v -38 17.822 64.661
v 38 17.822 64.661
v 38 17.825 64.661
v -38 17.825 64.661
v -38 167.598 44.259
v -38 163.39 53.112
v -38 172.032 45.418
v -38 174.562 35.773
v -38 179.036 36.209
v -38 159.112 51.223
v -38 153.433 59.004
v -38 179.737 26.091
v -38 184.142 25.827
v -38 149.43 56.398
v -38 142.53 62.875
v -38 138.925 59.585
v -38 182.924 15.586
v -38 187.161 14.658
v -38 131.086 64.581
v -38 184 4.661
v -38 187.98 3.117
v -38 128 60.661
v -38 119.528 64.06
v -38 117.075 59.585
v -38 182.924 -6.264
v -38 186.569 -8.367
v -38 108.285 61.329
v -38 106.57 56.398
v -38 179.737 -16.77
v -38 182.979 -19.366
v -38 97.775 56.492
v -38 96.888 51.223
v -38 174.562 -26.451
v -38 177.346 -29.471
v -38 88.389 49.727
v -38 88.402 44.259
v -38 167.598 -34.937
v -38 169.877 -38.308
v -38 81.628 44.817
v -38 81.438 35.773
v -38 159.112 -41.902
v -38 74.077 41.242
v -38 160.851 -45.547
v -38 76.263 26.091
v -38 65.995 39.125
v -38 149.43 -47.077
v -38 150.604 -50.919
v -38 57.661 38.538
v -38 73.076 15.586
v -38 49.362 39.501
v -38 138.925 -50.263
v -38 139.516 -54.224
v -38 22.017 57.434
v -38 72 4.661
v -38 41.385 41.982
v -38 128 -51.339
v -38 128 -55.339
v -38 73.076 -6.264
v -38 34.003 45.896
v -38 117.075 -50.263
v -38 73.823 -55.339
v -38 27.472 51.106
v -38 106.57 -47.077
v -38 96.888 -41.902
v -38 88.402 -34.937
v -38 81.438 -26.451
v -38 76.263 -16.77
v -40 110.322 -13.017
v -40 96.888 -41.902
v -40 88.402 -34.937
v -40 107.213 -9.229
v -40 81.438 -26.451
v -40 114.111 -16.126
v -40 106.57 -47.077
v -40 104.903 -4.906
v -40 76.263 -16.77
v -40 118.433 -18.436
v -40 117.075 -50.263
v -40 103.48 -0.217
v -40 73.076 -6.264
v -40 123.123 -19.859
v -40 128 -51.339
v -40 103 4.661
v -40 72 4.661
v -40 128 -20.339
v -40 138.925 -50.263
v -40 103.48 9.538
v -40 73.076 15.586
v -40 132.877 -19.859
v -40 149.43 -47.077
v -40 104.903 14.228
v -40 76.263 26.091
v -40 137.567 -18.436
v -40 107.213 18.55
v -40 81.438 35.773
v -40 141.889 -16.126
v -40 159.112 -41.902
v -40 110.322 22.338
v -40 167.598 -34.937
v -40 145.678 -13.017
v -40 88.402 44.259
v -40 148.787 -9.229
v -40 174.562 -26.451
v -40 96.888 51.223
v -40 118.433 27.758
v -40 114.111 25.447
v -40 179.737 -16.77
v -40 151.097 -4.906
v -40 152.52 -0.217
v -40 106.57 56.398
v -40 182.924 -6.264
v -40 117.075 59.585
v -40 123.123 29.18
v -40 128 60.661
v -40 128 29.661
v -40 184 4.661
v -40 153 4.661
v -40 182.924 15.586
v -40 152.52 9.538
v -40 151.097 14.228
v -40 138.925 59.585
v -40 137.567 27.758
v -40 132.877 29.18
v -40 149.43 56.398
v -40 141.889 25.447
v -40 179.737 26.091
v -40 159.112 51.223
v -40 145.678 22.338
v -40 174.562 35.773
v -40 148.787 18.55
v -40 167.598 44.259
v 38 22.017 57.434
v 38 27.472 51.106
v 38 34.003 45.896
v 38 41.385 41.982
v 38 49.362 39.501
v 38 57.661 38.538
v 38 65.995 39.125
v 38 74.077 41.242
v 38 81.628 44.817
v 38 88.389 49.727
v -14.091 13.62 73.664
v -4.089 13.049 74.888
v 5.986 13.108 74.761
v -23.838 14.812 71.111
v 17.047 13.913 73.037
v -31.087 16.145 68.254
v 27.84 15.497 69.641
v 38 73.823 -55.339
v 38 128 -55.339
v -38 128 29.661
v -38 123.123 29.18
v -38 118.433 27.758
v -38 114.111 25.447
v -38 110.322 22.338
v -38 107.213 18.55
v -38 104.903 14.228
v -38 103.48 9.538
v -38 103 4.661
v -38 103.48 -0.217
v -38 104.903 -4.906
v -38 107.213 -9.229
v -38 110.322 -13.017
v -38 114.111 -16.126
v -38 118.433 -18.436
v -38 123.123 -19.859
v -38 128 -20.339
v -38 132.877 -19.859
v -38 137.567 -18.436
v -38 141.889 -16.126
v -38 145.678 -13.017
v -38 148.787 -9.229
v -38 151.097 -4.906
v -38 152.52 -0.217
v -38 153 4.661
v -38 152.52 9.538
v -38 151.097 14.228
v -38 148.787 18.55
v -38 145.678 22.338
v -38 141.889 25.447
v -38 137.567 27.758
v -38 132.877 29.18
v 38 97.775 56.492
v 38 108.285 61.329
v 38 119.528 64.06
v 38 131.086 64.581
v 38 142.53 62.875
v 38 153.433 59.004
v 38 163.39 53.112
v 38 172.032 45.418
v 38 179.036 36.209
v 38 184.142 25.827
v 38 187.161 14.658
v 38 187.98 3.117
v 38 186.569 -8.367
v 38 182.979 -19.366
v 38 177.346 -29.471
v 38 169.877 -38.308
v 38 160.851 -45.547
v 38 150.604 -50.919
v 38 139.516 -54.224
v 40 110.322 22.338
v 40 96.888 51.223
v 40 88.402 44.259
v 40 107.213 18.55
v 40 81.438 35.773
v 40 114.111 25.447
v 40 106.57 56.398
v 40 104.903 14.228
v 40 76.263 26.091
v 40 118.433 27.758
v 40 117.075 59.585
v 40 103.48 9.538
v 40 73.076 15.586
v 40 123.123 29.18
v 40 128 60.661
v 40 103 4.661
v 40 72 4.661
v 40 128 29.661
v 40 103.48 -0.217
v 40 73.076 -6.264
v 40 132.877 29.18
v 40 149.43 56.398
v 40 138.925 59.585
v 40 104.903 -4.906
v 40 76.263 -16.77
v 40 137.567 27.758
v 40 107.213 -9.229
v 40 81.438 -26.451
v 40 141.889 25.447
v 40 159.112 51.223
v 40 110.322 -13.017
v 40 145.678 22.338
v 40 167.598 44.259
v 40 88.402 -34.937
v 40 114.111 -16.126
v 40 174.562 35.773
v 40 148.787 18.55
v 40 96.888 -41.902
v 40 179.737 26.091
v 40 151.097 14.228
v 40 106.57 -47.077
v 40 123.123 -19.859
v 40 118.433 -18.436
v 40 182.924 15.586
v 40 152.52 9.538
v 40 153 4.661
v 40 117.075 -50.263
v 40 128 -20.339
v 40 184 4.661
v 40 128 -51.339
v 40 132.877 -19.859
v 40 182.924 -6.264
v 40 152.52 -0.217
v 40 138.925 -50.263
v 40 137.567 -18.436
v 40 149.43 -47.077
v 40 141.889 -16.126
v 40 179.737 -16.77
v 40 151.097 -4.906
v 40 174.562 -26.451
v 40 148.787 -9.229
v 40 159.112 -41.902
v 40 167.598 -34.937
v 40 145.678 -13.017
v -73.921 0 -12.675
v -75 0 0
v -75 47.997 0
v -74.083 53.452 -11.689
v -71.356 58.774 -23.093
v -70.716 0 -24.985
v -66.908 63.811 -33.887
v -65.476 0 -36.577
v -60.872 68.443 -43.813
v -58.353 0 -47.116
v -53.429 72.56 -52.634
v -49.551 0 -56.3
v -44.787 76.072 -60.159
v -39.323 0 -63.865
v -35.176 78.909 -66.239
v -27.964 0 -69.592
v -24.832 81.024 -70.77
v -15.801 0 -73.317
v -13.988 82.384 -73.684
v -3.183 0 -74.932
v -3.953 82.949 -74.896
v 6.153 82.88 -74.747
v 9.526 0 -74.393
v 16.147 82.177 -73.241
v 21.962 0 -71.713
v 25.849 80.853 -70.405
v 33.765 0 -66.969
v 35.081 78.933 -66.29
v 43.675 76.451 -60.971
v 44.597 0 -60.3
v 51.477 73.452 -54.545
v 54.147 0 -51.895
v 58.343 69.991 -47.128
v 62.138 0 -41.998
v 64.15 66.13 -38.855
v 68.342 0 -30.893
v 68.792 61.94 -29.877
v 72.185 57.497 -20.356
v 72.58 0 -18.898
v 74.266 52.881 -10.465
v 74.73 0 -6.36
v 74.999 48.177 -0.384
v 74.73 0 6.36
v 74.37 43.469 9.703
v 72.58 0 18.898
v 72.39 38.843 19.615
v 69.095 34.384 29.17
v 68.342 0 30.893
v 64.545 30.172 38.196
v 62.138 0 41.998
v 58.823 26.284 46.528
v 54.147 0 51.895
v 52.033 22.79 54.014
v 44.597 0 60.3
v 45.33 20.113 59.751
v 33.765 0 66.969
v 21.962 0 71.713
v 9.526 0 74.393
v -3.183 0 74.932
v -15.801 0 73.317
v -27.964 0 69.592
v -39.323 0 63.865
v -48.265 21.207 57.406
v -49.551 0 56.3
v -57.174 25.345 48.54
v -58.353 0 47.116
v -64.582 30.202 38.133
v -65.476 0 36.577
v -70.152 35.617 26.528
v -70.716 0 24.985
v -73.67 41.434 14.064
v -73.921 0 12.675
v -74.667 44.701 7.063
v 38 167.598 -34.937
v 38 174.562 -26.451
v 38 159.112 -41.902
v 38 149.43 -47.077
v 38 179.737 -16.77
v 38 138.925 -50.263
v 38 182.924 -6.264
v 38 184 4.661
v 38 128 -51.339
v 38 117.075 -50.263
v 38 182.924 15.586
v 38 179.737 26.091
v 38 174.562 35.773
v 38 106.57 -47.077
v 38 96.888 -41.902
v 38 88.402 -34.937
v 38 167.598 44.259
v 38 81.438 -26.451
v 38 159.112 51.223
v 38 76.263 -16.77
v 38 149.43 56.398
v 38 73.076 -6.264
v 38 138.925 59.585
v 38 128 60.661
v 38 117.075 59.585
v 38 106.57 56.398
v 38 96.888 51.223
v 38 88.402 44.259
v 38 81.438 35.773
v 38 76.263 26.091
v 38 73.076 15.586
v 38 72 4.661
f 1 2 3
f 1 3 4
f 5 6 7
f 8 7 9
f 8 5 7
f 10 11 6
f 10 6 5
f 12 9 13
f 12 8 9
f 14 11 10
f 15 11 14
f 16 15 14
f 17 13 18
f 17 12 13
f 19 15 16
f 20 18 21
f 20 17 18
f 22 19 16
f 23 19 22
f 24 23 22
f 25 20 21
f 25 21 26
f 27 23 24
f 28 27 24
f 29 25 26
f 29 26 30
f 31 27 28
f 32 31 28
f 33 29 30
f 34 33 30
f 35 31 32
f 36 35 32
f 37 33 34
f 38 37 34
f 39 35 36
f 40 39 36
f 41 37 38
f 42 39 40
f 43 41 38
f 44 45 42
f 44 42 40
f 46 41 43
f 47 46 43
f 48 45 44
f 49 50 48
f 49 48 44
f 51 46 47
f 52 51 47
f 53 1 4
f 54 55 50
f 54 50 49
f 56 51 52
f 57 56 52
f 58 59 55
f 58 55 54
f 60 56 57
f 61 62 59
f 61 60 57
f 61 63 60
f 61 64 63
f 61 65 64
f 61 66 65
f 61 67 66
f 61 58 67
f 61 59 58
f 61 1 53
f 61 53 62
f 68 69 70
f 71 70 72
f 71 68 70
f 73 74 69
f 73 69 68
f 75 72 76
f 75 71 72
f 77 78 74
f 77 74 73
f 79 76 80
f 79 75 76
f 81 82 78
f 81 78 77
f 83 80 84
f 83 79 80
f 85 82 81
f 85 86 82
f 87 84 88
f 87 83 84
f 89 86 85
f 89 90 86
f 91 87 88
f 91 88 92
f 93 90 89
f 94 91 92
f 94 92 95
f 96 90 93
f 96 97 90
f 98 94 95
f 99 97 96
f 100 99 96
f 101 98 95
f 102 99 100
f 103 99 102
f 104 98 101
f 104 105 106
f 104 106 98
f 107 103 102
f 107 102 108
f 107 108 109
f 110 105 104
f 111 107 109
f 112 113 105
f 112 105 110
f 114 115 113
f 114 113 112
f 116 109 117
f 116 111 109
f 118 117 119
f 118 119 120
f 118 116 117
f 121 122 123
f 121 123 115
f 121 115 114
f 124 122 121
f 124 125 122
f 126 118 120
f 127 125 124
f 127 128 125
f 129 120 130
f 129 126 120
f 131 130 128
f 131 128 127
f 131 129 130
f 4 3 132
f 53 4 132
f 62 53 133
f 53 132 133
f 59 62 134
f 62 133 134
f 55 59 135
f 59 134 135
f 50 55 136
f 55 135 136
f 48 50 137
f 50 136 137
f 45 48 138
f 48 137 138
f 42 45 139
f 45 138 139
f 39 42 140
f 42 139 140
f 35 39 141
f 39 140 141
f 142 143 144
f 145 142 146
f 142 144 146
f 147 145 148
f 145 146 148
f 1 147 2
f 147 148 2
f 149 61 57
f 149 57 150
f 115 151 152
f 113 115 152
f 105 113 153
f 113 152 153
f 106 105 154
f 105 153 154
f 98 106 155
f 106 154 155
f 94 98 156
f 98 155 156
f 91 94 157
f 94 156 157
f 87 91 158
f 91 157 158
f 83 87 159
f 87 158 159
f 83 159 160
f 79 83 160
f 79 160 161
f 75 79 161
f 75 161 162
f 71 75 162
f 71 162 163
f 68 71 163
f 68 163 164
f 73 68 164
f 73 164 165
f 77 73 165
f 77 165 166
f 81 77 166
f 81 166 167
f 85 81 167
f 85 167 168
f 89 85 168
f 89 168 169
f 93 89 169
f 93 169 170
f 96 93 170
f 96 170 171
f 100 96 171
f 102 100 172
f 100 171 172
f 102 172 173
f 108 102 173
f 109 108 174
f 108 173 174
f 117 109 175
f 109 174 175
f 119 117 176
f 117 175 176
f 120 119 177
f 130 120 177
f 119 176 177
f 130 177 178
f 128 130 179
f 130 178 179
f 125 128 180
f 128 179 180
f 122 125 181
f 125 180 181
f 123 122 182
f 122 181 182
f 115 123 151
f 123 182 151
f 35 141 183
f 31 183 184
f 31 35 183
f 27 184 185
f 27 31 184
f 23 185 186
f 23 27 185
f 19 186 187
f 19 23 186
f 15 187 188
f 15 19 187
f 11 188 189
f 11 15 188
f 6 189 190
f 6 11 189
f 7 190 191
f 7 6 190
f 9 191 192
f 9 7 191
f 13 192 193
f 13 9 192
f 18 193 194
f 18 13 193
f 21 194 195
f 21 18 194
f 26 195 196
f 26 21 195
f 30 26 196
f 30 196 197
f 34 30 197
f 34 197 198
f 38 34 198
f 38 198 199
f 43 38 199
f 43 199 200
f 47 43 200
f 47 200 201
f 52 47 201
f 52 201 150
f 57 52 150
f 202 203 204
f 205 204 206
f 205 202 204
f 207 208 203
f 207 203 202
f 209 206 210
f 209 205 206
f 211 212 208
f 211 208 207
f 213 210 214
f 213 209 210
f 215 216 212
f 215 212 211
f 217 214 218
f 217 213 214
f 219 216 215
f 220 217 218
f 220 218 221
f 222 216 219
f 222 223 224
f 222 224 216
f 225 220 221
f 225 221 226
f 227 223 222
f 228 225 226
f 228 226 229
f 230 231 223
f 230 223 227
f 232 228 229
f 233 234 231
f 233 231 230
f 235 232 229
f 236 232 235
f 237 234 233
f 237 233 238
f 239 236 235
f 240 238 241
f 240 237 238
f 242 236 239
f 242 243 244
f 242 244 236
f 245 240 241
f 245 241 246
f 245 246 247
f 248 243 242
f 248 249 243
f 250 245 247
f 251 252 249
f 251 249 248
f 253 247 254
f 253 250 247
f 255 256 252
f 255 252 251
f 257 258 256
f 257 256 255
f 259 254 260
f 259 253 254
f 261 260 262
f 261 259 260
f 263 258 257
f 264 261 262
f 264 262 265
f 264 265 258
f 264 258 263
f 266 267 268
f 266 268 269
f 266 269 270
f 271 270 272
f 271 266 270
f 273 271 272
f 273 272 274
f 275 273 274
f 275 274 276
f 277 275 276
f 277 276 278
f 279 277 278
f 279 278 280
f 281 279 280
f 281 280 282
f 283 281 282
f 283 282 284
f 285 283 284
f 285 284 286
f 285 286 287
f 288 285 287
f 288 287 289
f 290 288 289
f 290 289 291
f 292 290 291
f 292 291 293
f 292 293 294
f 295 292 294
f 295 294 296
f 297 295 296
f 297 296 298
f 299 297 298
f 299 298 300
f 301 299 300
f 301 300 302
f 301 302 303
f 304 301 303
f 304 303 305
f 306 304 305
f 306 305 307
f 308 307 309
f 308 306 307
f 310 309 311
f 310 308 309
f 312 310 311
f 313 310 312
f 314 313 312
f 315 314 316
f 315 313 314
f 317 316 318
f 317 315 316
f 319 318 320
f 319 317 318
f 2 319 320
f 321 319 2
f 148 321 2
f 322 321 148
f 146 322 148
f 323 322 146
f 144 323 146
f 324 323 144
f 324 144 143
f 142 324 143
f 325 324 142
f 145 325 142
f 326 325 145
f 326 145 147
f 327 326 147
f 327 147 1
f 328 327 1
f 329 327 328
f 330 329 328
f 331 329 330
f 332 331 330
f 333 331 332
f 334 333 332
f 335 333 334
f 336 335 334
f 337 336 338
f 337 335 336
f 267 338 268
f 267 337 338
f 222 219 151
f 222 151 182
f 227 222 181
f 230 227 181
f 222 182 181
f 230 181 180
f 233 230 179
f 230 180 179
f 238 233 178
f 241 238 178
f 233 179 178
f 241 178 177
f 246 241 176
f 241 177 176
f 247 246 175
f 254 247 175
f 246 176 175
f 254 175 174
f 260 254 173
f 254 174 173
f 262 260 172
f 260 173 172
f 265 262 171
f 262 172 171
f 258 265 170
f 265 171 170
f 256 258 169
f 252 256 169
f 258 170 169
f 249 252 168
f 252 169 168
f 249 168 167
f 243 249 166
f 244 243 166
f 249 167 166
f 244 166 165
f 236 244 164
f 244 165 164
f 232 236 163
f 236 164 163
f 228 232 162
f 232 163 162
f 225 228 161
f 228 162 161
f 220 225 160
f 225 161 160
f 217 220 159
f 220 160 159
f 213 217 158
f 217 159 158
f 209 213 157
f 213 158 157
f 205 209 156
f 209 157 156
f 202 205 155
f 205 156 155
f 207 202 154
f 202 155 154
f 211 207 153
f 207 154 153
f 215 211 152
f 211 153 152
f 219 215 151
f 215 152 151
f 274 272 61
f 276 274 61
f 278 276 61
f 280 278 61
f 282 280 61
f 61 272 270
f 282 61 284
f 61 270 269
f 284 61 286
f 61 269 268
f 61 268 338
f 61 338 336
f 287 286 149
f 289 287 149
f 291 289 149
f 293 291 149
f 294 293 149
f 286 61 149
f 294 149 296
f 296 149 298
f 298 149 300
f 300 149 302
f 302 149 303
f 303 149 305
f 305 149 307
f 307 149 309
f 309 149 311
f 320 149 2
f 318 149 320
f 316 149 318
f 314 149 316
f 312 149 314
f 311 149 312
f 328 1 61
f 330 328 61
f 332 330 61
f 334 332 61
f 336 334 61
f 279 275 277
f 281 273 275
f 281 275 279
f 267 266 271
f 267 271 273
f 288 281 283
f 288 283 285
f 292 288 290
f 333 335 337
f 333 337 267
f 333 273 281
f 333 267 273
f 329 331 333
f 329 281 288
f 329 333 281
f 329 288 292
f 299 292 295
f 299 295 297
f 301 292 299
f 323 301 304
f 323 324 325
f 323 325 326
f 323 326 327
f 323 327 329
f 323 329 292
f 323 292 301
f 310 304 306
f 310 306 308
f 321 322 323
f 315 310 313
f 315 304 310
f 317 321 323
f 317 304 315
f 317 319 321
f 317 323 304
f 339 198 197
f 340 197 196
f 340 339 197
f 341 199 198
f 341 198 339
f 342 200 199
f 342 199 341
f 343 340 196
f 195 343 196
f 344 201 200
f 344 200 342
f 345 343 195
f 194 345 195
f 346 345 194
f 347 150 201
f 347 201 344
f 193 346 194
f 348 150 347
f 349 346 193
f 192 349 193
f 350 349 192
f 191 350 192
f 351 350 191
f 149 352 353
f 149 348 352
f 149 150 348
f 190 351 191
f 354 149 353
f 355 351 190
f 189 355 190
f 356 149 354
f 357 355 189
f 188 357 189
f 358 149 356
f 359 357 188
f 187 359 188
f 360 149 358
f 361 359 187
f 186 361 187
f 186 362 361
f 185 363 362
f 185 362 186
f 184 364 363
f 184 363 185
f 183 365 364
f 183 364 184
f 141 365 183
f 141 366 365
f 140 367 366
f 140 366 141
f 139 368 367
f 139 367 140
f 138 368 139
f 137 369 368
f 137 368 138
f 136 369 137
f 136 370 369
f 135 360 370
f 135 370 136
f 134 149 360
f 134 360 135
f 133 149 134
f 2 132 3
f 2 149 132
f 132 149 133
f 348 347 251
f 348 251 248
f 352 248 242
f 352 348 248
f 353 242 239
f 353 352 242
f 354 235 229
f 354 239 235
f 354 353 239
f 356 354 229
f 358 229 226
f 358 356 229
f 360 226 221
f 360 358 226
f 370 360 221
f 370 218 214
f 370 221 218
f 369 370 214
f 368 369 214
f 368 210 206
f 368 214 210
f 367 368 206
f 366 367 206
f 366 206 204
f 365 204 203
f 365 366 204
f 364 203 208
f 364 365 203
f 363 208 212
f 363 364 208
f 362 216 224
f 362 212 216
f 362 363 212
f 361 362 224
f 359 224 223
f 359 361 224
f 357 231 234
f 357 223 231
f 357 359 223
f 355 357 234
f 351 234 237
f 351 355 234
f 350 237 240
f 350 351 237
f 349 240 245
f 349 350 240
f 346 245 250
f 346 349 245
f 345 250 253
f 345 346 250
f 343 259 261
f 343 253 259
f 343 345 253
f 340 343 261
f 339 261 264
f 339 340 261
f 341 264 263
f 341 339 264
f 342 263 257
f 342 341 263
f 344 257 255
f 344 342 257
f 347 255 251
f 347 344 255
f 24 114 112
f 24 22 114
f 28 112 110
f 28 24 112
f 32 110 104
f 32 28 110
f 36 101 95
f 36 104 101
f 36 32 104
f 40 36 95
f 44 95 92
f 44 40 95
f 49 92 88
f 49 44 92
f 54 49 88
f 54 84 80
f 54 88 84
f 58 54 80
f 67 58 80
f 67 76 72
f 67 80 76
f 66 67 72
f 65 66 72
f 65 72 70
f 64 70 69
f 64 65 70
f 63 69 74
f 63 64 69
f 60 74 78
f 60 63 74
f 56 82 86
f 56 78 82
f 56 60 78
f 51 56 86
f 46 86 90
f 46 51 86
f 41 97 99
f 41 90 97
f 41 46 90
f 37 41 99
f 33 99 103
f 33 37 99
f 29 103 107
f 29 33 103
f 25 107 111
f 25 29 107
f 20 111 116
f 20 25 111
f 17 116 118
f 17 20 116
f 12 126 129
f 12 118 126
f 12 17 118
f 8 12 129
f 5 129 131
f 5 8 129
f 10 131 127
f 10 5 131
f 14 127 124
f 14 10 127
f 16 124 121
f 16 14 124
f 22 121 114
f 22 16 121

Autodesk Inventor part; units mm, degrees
ref_plane "YZ Plane" through (0, 0, 0) normal (1, 0, 0) x (0, 1, 0)
ref_plane "XZ Plane" through (0, 0, 0) normal (0, 1, 0) x (-1, 0, 0)
sketch "Sketch1" plane through (0, 0, 0) normal (0, 1, 0) x (-1, 0, 0)
  circle A0 centre (0, 0) radius 75
  dimension "d0" = 150
extrude "Extrusion1" add sketch "Sketch1" along normal blind 83
ref_plane "Work Plane1" through (71.3599, 83, -75) normal (0, -0.9062, -0.4229) x (1, 0, 0)
sketch "Sketch4" plane through (71.3599, 83, -75) normal (0, -0.9062, -0.4229) x (1, 0, 0)
  line L0 (-176.8472, 196.5702) -> (33.3097, 196.5702)
  line L1 (33.3097, 196.5702) -> (33.3097, -66.4056)
  line L2 (33.3097, -66.4056) -> (-176.8472, -66.4056)
  line L3 (-176.8472, -66.4056) -> (-176.8472, 196.5702)
  point P0 (-71.3599, 103.0632)
extrude "Extrusion4" cut sketch "Sketch4" against normal blind 80
sketch "Sketch5" plane through (0, 0, 0) normal (0, -1, 0) x (1, 0, 0)
  circle A0 centre (0, 0) radius 75 projected
  line L0 (38, 64.6607) -> (-38, 64.6607)
  line L1 (-38, 64.6607) -> (-38, -55.3393)
  line L2 (-38, -55.3393) -> (38, -55.3393)
  line L3 (38, -55.3393) -> (38, 64.6607)
  dimension "d9" = 76
  dimension "d10" = 120
extrude "Extrusion5" add sketch "Sketch5" against normal blind 188 contours L3 L2 L1 L0
sketch "Sketch6" plane through (38, 17.825, 64.6607) normal (1, 0, 0) x (0, 0, -1)
  circle A0 centre (60, 110.175) radius 60
  line L0 (0, 170.175) -> (120, 170.175) projected
  line L1 (0, 0) -> (0, 170.175) projected
  circle A1 centre (60, 110.175) radius 56
  line L2 (0, 110.175) -> (0, 0)
  line L3 (0, 0) -> (139.6607, 65.175) projected
  circle A2 centre (-18.8653, 40.855) radius 45
  point P0 (64.6607, -17.825)
  point P1 (0, 110.175)
  point P2 (60, 170.175)
  point P3 (0, 81.7096)
  point P4 (0, 0.0004)
  point P5 (14.9341, 70.5636)
  dimension "d13" = 120
  dimension "d20" = 112
  dimension "d32" = 90
extrude "Extrusion6" cut sketch "Sketch6" against normal blind 188 contours A0 L1 L0
sketch "Sketch7" plane through (-38, 73.825, -55.3393) normal (-1, 0, 0) x (0, 0, 1)
  circle A0 centre (60, 54.175) radius 60
  line L0 (0, 0) -> (0, 114.175) projected
  line L1 (0, 0) -> (0, 114.175)
  line L2 (60, 114.175) -> (0, 114.175) projected
  line L3 (0, 114.175) -> (60, 114.175)
  line L4 (60, 114.175) -> (0, 114.175)
  circle A1 centre (60, 54.175) radius 56
  circle A2 centre (60, 54.175) radius 25
  point P0 (55.3393, -73.825)
  point P1 (0, 54.175)
  dimension "d16" = 120
  dimension "d23" = 112
  dimension "d26" = 50
extrude "Extrusion7" cut sketch "Sketch7" against normal blind 188 contours A0 L0 L2
extrude "Extrusion8" add sketch "Sketch6" along normal blind 2 contours A1
extrude "Extrusion9" add sketch "Sketch7" along normal blind 2 contours A1 | A2
extrude "Extrusion10" cut sketch "Sketch7" against normal blind 100 contours A2
extrude "Extrusion11" cut sketch "Sketch7" along normal blind 100 contours A2
extrude "Extrusion12" cut sketch "Sketch6" against normal blind 100 contours A2 L1 picked at (2.4551, 28.6667)
extrude "Extrusion13" cut sketch "Sketch6" against normal blind 100 contours A2 L1 A0
